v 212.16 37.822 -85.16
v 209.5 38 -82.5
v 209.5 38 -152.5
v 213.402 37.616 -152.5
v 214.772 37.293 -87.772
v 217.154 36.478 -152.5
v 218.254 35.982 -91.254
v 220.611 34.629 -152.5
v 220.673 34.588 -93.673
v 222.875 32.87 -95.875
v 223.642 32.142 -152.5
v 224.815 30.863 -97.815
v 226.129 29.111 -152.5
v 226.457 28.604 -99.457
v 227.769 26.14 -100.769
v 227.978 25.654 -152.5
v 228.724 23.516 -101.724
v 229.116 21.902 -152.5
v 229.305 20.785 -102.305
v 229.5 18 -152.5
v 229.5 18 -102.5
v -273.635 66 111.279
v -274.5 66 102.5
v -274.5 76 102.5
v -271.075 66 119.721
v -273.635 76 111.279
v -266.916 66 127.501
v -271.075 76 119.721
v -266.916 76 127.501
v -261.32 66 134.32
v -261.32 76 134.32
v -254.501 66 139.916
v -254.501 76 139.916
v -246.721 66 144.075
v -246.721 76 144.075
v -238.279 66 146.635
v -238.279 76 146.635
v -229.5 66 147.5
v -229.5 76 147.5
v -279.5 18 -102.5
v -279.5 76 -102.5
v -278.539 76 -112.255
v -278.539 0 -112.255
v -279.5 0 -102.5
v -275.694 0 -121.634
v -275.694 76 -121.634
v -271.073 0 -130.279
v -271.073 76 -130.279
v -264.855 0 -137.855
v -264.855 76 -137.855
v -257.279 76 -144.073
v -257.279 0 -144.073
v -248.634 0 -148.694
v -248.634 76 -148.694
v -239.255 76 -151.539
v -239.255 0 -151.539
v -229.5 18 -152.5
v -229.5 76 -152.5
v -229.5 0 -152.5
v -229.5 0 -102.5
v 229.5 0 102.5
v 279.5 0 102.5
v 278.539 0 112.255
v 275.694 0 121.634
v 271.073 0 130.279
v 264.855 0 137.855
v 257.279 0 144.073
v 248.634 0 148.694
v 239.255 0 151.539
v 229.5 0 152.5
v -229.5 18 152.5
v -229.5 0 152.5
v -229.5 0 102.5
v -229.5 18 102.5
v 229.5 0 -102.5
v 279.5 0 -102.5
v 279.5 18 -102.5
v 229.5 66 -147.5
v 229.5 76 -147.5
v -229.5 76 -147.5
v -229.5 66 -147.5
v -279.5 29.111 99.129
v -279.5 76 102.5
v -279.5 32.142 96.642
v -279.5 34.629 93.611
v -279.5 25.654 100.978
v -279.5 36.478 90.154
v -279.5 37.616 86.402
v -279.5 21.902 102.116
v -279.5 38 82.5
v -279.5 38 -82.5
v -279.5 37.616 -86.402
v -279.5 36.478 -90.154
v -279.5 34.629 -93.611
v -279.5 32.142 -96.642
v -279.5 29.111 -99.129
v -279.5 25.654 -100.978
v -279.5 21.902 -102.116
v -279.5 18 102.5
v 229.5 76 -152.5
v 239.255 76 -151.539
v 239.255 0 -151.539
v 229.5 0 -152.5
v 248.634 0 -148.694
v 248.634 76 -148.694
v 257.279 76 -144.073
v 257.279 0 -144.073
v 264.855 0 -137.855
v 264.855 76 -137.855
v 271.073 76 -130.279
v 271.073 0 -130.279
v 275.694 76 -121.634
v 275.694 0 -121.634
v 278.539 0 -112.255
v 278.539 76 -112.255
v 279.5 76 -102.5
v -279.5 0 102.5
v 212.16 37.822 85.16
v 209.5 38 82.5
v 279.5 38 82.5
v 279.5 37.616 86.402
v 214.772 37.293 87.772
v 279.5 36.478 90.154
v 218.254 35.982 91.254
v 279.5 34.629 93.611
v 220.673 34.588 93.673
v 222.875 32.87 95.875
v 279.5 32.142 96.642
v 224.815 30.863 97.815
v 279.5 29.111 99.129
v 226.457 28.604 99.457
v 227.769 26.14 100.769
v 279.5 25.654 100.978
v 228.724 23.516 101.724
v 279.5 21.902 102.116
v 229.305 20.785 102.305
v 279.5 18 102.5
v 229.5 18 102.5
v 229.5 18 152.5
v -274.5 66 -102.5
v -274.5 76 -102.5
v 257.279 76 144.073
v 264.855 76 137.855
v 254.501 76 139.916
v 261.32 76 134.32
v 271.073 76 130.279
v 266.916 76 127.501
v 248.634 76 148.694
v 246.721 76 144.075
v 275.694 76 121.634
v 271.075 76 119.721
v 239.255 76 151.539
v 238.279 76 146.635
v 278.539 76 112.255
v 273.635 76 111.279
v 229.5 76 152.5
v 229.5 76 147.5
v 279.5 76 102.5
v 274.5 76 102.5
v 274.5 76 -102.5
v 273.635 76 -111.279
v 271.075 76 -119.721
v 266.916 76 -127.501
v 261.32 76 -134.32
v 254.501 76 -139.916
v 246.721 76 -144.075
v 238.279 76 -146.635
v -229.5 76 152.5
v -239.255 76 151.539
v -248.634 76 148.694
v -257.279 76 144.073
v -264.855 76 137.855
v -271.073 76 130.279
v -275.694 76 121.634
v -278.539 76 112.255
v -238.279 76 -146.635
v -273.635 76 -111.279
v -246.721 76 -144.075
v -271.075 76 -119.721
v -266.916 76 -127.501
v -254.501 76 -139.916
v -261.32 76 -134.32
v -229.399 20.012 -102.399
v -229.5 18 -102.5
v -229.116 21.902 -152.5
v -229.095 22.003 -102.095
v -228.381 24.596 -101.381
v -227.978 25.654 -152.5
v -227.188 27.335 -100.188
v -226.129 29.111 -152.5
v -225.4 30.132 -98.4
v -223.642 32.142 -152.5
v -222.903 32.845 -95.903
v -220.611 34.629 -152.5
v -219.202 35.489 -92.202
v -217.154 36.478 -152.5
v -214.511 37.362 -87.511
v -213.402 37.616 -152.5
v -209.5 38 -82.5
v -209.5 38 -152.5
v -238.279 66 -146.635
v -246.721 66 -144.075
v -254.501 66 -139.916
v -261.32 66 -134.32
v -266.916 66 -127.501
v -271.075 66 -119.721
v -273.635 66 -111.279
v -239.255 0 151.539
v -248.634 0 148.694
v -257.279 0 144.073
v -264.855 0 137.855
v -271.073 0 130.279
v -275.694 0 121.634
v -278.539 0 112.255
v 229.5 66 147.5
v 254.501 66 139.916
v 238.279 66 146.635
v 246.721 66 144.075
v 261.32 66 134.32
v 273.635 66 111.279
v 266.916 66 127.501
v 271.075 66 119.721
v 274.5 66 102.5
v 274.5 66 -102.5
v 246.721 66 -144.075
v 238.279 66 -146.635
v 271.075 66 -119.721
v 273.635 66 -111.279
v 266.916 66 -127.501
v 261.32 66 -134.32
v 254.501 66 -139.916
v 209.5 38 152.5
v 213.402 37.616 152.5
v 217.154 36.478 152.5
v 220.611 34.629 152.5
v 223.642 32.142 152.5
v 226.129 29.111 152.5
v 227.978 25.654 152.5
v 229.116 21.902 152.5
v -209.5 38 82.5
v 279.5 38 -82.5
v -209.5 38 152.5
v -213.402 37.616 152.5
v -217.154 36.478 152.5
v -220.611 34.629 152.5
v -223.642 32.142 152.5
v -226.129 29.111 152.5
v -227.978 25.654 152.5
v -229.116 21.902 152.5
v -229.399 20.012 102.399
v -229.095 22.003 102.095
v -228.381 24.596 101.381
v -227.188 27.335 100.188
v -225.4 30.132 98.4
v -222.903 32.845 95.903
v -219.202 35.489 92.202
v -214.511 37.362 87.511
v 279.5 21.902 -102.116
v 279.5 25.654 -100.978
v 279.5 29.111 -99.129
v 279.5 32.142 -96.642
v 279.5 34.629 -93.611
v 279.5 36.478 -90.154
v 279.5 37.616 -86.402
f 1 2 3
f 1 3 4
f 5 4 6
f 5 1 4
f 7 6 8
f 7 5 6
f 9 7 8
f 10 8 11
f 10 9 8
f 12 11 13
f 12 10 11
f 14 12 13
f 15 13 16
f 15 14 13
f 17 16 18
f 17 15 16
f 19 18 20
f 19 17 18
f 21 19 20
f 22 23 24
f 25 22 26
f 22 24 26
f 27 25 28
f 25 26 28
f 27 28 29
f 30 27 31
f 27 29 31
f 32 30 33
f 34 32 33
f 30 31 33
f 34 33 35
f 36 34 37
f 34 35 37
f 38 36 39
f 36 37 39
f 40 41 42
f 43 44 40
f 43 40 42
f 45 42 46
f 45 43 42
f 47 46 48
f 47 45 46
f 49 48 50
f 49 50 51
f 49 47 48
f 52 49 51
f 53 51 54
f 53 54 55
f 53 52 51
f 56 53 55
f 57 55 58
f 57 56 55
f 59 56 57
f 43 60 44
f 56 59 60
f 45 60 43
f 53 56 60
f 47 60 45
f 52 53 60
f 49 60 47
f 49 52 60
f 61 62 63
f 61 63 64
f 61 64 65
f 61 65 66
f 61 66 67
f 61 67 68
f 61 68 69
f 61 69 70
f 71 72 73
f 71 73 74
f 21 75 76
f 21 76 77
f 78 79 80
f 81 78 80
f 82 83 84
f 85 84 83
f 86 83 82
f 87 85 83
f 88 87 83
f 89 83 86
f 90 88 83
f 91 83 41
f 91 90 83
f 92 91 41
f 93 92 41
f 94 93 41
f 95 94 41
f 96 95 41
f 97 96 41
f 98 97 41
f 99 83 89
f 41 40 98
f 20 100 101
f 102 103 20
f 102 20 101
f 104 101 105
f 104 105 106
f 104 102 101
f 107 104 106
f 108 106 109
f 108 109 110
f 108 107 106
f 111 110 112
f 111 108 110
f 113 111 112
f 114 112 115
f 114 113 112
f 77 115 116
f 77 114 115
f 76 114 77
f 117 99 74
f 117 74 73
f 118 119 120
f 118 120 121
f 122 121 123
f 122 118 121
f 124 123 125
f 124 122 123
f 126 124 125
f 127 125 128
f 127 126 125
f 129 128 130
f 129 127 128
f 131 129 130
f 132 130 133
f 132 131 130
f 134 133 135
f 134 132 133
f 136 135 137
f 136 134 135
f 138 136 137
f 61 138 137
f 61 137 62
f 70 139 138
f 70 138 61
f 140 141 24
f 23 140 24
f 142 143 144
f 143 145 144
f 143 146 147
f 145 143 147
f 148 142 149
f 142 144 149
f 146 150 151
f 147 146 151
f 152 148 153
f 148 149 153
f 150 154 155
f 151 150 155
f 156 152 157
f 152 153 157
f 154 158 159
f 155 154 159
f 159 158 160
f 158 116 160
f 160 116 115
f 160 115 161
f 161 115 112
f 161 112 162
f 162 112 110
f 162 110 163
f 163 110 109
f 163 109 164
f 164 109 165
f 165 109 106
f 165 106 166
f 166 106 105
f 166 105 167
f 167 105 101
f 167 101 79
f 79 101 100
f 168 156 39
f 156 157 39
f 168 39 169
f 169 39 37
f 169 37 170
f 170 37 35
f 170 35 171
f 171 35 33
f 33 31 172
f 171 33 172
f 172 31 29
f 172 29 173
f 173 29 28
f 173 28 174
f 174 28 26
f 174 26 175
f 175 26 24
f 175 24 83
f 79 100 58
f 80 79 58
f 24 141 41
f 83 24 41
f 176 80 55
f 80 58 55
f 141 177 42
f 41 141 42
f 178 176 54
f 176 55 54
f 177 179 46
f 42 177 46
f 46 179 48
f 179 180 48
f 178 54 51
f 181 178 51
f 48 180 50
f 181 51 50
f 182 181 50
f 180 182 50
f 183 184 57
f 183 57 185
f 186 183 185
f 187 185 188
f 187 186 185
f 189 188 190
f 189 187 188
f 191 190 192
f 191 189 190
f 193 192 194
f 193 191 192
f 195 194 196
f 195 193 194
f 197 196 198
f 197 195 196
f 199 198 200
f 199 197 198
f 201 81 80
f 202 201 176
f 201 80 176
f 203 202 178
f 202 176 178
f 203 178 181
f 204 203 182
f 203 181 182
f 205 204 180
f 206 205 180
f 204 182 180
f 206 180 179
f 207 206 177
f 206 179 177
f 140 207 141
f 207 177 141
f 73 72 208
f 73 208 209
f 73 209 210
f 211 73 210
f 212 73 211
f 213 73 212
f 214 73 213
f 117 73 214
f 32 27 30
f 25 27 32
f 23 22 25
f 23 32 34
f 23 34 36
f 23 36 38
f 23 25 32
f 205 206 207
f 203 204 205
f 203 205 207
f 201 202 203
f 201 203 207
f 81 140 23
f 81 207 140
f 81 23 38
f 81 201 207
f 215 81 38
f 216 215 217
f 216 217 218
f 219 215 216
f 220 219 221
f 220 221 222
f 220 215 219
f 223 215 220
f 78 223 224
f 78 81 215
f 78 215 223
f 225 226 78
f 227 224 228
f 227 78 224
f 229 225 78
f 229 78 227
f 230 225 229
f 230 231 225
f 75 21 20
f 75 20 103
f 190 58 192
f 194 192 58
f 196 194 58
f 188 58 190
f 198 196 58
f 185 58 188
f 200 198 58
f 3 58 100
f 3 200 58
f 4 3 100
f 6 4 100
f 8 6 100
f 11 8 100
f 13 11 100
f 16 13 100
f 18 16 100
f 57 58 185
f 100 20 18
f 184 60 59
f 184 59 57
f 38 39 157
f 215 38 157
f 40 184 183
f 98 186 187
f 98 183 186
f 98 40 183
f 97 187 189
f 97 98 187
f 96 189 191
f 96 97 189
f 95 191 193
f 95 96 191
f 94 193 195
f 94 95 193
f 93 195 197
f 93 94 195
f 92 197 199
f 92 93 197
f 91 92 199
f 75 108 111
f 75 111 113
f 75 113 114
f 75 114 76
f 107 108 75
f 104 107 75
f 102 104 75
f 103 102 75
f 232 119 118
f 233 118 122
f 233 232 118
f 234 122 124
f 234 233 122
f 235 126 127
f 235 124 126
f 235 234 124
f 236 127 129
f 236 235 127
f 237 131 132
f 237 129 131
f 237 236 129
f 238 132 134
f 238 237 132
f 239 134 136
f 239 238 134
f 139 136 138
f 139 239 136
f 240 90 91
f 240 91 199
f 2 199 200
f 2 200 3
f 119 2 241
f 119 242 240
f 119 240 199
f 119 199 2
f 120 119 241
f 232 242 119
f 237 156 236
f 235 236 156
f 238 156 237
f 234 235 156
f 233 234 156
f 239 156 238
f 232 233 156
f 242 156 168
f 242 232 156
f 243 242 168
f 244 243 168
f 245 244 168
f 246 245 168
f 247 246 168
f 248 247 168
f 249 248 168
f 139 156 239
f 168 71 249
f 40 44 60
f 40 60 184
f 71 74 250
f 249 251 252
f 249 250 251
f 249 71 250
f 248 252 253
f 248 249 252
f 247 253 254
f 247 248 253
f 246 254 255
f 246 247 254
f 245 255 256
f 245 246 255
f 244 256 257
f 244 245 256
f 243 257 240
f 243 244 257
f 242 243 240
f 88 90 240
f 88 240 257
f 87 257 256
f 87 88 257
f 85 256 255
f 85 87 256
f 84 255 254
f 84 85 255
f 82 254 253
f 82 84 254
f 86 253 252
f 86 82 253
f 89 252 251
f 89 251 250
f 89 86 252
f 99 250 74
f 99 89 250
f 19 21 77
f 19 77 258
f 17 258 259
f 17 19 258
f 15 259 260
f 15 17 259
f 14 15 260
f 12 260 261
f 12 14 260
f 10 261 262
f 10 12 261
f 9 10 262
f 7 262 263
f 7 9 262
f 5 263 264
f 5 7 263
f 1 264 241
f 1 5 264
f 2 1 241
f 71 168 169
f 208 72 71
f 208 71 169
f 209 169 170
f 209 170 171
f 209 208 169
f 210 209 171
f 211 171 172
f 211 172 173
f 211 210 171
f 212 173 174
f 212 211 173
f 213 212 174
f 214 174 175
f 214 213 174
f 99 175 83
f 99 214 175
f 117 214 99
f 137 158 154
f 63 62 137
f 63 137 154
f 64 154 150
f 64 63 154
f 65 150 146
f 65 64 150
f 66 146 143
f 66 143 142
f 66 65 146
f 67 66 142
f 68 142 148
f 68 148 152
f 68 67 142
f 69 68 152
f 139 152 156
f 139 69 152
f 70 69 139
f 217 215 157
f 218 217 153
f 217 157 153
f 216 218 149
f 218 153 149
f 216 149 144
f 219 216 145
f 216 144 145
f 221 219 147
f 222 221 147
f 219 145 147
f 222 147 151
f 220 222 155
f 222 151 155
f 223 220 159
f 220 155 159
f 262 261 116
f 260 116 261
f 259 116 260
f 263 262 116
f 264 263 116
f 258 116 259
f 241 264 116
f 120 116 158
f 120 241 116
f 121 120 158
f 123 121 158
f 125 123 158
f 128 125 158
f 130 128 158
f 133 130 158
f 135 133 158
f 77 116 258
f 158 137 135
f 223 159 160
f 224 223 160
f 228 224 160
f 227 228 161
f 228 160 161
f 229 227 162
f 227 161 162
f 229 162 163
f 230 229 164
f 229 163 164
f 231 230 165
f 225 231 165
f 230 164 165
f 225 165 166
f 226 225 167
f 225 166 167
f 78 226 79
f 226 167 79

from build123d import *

# Parameters (mm, degrees)
BOSS_EXTRUDE1_DEPTH = 76
CUT_EXTRUDE1_DEPTH  = 10
CUT_EXTRUDE2_DEPTH  = 421.62007798
CUT_EXTRUDE3_DEPTH  = 585.391350039


with BuildPart() as part:
    # Sketch1 → Boss-Extrude1 (new body)
    with BuildSketch(Plane(origin=(0, 0, 0), x_dir=(1, 0, 0), z_dir=(0, 1, 0))):
        with BuildLine():
            Line((-229.5, 152.5), (229.5, 152.5))
            ThreePointArc((229.5, 152.5), (264.855339059, 137.855339059), (279.5, 102.5))
            Line((279.5, 102.5), (279.5, -102.5))
            ThreePointArc((279.5, -102.5), (264.855339059, -137.855339059), (229.5, -152.5))
            Line((229.5, -152.5), (-229.5, -152.5))
            ThreePointArc((-229.5, -152.5), (-264.855339059, -137.855339059), (-279.5, -102.5))
            Line((-279.5, -102.5), (-279.5, 102.5))
            ThreePointArc((-279.5, 102.5), (-264.855339059, 137.855339059), (-229.5, 152.5))
        make_face()
    extrude(amount=BOSS_EXTRUDE1_DEPTH)

    # Sketch3 → Cut-Extrude1 (cut)
    with BuildSketch(Plane(origin=(0, 76, 0), x_dir=(1, 0, 0), z_dir=(0, 1, 0))):
        with BuildLine():
            Line((-274.5, 102.5), (-274.5, -102.5))
            ThreePointArc((-274.5, -102.5), (-261.319805153, -134.319805153), (-229.5, -147.5))
            Line((-229.5, -147.5), (229.5, -147.5))
            ThreePointArc((229.5, -147.5), (261.319805153, -134.319805153), (274.5, -102.5))
            Line((274.5, -102.5), (274.5, 102.5))
            ThreePointArc((274.5, 102.5), (261.319805153, 134.319805153), (229.5, 147.5))
            Line((229.5, 147.5), (-229.5, 147.5))
            ThreePointArc((-229.5, 147.5), (-261.319805153, 134.319805153), (-274.5, 102.5))
        make_face()
    extrude(amount=-CUT_EXTRUDE1_DEPTH, mode=Mode.SUBTRACT)

    # Sketch4 → Cut-Extrude2 (cut, through all)
    with BuildSketch(Plane.XY.offset(152.5)):
        with BuildLine():
            Line((-229.5, 0), (-229.5, 18))
            ThreePointArc((-229.5, 18), (-223.642135624, 32.142135624), (-209.5, 38))
            Line((-209.5, 38), (209.5, 38))
            ThreePointArc((209.5, 38), (223.642135624, 32.142135624), (229.5, 18))
            Line((229.5, 18), (229.5, 0))
            Line((229.5, 0), (-229.5, 0))
        make_face()
    extrude(amount=-CUT_EXTRUDE2_DEPTH, mode=Mode.SUBTRACT)

    # Sketch5 → Cut-Extrude3 (cut, through all)
    with BuildSketch(Plane.ZY.offset(279.5)):
        with BuildLine():
            Line((-102.5, 0), (-102.5, 18))
            ThreePointArc((-102.5, 18), (-96.642135624, 32.142135624), (-82.5, 38))
            Line((-82.5, 38), (82.5, 38))
            ThreePointArc((82.5, 38), (96.642135624, 32.142135624), (102.5, 18))
            Line((102.5, 18), (102.5, 0))
            Line((102.5, 0), (-102.5, 0))
        make_face()
    extrude(amount=-CUT_EXTRUDE3_DEPTH, mode=Mode.SUBTRACT)


solid = part.part
